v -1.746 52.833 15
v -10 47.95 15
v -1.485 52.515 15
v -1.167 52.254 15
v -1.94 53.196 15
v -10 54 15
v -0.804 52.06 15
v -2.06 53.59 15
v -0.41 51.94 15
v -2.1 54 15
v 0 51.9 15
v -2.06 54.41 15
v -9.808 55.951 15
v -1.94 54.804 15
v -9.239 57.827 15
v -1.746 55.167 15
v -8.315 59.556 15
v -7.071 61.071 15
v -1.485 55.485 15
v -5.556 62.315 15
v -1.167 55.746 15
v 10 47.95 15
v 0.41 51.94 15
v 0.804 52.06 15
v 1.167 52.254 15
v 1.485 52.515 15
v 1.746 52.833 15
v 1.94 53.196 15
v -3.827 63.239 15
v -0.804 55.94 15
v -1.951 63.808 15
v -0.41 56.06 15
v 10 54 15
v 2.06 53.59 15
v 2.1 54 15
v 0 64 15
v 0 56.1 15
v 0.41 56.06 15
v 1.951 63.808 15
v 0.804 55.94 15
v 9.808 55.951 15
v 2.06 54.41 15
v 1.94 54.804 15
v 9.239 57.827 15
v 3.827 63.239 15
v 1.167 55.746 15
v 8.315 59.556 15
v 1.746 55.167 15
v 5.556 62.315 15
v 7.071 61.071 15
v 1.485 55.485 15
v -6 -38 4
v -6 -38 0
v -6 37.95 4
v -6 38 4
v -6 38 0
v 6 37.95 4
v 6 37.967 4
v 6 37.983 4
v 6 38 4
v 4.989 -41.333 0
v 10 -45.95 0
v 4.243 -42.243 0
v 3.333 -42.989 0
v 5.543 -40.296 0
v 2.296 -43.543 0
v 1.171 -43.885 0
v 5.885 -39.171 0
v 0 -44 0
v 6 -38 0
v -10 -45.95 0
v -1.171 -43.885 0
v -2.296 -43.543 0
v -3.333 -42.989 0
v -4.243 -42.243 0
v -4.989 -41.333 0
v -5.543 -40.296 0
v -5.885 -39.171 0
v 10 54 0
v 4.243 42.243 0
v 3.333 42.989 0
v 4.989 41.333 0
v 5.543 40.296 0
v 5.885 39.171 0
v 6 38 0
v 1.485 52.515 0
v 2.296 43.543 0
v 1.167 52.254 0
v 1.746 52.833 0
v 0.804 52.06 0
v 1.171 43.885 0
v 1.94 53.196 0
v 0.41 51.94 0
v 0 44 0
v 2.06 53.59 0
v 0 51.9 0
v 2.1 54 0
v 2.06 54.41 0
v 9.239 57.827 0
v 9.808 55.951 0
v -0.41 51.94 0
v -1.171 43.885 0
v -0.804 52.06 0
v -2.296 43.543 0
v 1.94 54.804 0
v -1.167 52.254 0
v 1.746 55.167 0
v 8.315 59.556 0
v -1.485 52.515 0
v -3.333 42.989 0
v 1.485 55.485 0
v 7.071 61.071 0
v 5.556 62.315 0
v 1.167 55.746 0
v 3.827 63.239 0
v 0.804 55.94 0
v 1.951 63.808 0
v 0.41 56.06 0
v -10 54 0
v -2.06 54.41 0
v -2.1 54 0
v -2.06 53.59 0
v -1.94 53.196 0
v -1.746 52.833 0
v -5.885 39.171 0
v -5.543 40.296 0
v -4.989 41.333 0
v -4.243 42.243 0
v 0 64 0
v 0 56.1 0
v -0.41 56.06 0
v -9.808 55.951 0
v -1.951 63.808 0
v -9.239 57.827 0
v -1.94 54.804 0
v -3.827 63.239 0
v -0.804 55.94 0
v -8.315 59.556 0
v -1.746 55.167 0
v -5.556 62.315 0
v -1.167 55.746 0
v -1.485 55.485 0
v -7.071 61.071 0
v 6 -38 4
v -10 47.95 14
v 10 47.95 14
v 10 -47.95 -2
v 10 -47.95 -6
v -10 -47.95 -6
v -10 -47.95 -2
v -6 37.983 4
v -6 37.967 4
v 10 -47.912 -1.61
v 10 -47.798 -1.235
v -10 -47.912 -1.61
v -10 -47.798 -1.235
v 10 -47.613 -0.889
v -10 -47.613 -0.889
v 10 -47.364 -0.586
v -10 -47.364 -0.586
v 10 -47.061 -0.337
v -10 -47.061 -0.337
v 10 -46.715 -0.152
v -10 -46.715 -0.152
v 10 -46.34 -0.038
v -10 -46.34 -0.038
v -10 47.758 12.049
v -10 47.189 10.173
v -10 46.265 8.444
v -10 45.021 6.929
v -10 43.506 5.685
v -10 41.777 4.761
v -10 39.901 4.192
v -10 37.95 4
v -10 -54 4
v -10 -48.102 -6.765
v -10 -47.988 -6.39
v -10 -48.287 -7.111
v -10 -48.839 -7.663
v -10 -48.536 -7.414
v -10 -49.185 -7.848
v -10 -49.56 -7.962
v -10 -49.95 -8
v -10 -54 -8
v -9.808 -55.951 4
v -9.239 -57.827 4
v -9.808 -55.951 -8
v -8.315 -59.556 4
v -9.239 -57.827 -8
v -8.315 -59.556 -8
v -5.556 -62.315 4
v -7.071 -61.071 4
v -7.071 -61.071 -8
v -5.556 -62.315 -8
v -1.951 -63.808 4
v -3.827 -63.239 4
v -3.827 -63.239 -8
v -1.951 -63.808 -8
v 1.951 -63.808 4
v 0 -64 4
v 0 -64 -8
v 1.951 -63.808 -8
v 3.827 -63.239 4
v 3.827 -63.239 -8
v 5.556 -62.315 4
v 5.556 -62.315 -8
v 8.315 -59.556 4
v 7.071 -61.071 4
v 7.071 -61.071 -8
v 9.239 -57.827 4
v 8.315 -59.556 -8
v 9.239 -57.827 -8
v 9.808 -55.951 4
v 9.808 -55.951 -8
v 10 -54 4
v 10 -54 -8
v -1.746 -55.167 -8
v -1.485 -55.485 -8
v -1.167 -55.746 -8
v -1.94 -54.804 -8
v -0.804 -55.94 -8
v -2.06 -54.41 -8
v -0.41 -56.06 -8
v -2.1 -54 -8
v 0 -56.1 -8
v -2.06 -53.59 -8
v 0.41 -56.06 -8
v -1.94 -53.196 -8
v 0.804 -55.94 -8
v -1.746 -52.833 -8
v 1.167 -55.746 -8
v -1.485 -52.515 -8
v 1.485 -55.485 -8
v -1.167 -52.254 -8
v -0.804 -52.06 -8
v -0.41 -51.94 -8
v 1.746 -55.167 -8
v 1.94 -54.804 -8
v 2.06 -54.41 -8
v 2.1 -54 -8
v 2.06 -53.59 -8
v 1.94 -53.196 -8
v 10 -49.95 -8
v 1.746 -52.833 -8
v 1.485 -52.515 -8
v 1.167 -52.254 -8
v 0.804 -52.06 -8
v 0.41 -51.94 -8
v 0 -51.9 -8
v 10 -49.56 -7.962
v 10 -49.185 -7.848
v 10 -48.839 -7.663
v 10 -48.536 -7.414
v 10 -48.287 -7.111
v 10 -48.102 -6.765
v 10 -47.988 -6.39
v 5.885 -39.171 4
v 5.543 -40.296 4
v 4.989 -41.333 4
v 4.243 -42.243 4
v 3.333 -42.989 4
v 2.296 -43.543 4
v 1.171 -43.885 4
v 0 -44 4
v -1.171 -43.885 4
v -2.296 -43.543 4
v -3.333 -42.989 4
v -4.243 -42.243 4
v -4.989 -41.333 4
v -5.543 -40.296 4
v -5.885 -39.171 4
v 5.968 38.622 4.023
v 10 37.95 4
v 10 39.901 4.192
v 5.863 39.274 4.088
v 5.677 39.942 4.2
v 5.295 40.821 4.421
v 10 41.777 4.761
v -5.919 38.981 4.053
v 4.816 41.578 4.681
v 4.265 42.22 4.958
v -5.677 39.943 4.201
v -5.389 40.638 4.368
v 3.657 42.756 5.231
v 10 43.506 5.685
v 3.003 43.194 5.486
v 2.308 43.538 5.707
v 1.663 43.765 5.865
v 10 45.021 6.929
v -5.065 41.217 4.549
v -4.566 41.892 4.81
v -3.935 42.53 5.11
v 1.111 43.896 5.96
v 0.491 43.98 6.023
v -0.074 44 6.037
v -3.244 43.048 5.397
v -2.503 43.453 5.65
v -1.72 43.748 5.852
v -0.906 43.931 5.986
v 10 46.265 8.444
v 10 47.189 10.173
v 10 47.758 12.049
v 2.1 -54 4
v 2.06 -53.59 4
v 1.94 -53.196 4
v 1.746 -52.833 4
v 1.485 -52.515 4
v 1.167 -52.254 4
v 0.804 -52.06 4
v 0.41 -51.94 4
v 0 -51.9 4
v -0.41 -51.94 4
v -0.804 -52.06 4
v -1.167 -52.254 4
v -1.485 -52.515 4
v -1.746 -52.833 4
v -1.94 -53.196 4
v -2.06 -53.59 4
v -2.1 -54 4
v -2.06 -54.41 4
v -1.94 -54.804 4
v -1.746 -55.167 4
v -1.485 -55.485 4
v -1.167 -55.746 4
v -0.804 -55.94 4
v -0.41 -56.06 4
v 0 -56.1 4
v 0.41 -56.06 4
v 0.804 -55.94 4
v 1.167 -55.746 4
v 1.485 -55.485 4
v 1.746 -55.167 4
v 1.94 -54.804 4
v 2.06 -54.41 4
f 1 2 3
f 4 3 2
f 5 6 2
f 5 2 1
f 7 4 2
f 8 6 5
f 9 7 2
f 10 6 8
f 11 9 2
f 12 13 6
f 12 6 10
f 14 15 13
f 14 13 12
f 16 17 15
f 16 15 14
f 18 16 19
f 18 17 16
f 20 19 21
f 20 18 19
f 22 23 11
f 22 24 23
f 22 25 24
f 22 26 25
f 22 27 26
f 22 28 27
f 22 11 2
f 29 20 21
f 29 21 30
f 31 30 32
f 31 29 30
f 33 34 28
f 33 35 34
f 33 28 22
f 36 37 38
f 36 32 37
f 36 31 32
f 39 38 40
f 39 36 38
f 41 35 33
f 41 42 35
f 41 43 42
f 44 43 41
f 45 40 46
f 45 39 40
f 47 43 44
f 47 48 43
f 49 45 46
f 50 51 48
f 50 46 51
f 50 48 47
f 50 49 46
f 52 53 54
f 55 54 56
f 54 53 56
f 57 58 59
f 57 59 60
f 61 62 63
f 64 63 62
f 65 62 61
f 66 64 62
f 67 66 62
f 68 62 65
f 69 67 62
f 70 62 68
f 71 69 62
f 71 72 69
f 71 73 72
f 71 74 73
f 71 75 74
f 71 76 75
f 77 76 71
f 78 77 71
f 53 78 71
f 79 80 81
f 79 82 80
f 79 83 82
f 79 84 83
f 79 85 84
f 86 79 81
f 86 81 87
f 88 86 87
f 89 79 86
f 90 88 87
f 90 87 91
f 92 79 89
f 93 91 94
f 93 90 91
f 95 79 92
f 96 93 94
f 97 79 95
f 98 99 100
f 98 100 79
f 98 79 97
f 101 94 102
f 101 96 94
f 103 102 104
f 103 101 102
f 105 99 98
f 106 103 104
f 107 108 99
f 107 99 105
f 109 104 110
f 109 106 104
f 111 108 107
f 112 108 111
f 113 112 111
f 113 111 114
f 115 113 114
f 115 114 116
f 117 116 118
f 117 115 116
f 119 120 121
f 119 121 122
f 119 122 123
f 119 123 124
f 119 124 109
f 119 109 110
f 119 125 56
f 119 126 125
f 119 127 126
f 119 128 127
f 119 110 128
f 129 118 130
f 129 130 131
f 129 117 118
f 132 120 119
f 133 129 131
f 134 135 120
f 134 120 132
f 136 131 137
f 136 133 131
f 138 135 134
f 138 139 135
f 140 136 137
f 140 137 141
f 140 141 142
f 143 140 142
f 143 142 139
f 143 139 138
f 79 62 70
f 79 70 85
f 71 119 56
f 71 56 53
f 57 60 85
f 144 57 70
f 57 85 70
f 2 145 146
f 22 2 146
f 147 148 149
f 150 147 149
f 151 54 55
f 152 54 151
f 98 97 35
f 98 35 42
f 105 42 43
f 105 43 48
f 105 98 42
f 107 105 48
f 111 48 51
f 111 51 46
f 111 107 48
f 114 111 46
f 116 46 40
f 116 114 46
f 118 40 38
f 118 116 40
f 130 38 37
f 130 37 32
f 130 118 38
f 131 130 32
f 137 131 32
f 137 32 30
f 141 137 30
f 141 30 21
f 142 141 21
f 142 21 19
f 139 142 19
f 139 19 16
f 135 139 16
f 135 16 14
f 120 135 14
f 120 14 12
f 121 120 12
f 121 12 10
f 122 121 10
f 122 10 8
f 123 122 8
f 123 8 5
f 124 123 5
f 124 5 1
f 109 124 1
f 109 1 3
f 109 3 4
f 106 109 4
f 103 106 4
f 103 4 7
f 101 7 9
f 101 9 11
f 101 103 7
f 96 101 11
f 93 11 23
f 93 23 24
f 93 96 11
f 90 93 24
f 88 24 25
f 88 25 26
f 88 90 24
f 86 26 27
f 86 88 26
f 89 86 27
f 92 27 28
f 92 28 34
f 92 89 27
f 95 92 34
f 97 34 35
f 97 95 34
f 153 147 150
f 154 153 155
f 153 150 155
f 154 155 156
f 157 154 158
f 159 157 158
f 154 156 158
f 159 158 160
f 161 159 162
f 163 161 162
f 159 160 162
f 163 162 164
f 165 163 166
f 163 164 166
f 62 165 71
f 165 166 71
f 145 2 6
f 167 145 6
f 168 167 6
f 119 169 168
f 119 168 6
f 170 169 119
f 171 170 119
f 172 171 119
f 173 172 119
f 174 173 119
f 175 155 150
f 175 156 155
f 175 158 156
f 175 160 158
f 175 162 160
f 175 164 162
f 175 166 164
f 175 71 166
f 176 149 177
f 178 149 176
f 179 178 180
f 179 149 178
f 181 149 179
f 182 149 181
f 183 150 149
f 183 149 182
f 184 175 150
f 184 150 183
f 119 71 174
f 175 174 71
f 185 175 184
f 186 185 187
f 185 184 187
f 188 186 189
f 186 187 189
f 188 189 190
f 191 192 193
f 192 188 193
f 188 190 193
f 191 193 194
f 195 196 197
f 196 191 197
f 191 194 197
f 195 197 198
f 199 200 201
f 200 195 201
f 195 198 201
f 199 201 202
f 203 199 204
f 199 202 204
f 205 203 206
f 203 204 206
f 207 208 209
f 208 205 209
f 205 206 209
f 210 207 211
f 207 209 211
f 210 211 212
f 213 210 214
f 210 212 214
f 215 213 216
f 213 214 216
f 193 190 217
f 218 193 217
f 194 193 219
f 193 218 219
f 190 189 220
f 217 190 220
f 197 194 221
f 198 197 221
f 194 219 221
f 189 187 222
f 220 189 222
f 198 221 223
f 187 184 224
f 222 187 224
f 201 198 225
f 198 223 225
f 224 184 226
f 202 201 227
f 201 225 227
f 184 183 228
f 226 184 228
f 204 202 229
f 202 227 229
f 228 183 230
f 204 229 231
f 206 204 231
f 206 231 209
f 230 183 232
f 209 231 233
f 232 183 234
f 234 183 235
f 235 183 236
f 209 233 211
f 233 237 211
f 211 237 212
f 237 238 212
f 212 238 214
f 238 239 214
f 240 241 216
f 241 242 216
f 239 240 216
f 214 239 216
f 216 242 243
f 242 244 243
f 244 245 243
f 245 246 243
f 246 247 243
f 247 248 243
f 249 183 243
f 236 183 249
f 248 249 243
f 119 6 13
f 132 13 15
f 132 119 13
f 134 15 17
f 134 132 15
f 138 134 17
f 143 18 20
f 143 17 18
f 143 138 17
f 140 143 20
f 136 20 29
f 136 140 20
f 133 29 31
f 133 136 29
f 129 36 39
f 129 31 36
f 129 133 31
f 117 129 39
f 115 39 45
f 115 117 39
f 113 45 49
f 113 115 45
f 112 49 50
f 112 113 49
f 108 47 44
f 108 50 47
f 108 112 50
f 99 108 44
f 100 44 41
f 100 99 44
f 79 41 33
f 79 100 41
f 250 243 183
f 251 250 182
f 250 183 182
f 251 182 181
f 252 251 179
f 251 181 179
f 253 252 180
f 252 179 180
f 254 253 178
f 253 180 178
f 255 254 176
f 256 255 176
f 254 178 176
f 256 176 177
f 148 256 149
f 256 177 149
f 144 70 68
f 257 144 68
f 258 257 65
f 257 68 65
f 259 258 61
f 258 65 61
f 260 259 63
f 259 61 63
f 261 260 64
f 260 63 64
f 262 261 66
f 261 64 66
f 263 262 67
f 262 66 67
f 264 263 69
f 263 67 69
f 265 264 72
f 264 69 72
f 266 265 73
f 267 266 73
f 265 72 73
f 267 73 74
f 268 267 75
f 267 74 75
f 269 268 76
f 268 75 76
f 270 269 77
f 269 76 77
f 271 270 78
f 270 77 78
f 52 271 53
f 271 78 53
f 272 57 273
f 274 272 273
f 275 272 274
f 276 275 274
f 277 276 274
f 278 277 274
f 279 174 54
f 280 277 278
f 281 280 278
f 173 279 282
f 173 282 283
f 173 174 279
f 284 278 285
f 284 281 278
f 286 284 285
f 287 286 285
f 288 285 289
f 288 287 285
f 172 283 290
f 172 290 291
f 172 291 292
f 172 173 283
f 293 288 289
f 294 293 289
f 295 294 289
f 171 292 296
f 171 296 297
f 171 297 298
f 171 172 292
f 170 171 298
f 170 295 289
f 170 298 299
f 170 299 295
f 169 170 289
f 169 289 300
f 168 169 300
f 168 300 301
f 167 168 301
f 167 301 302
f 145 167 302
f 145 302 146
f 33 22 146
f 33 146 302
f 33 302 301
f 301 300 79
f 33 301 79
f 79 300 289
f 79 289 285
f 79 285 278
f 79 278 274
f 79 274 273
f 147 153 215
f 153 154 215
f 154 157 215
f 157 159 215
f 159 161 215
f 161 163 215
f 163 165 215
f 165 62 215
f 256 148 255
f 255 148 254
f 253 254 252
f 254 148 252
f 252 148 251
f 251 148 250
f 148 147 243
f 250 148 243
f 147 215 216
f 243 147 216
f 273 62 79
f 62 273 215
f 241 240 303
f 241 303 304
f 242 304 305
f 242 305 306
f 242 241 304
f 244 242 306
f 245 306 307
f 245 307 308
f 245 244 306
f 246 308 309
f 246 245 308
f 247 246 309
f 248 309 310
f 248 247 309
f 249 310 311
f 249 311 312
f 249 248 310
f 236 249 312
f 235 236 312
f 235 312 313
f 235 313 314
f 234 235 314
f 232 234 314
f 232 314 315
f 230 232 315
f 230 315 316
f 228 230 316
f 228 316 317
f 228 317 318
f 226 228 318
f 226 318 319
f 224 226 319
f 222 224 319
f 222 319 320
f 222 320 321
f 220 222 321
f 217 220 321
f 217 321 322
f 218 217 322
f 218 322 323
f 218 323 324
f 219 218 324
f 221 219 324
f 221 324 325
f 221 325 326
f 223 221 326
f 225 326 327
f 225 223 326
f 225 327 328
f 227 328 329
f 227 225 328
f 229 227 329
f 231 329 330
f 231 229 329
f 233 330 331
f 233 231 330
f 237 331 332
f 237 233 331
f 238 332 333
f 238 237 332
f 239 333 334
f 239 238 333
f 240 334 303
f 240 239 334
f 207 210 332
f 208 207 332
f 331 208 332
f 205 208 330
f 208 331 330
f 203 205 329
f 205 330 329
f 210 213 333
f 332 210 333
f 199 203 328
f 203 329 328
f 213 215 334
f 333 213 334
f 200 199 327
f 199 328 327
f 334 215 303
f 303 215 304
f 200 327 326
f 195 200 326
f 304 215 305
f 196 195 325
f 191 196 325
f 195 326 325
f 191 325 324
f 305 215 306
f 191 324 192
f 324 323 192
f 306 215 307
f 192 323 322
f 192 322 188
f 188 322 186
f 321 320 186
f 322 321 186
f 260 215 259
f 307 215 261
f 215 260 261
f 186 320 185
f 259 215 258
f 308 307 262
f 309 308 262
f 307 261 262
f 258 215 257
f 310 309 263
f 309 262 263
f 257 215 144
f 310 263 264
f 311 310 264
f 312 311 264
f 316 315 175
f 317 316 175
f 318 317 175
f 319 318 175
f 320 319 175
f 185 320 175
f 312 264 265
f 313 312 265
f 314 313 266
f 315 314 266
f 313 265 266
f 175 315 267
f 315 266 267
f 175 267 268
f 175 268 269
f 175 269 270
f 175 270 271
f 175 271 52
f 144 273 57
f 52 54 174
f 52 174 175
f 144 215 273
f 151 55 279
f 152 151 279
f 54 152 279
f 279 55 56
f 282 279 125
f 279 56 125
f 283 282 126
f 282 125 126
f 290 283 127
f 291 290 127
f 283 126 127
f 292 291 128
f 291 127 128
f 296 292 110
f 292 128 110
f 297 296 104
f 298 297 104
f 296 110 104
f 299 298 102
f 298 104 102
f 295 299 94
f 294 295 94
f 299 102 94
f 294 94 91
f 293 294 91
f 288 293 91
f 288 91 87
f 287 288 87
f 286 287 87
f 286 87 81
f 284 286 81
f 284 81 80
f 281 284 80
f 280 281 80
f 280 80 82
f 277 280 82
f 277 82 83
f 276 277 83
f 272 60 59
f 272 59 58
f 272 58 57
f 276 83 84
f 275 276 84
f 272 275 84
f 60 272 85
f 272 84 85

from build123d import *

# Parameters (mm, degrees)
CROQUIS1_R              = 2.1
SALIENTE_EXTRUIR1_DEPTH = 4
SALIENTE_EXTRUIR2_START = -8
CROQUIS1_5_R            = 2.1
SALIENTE_EXTRUIR2_DEPTH = 8
REDONDEO2_R             = 2
CROQUIS1_6_R            = 2.1
SALIENTE_EXTRUIR3_DEPTH = 15
REDONDEO1_R             = 10


with BuildPart() as part:
    # Croquis1 → Saliente-Extruir1 (new body)
    with BuildSketch(Plane.XY):
        with BuildLine():
            Line((10, 54), (10, -54))
            ThreePointArc((10, -54), (0, -64), (-10, -54))
            Line((-10, -54), (-10, 54))
            ThreePointArc((-10, 54), (0, 64), (10, 54))
        make_face()
        with Locations((0, 54)):
            Circle(CROQUIS1_R, mode=Mode.SUBTRACT)
        with Locations((0, -54)):
            Circle(CROQUIS1_R, mode=Mode.SUBTRACT)
        with BuildLine():
            Line((6, 38), (6, -38))
            ThreePointArc((6, -38), (0, -44), (-6, -38))
            Line((-6, -38), (-6, 38))
            ThreePointArc((-6, 38), (0, 44), (6, 38))
        make_face(mode=Mode.SUBTRACT)
    extrude(amount=SALIENTE_EXTRUIR1_DEPTH)

    # Croquis1<5> → Saliente-Extruir2 (add)
    with BuildSketch(Plane.XY.offset(SALIENTE_EXTRUIR2_START)):
        with BuildLine():
            Line((10, -54), (10, -47.95))
            Line((10, -47.95), (-10, -47.95))
            Line((-10, -47.95), (-10, -54))
            ThreePointArc((-10, -54), (0, -64), (10, -54))
        make_face()
        with Locations((0, -54)):
            Circle(CROQUIS1_5_R, mode=Mode.SUBTRACT)
    extrude(amount=SALIENTE_EXTRUIR2_DEPTH)

    # Redondeo2
    redondeo2_edges = [part.edges().sort_by_distance(p)[0] for p in [
        (0, -47.95, 0),
        (0, -47.95, -8),
    ]]
    fillet(redondeo2_edges, radius=REDONDEO2_R)

    # Croquis1<6> → Saliente-Extruir3 (add)
    with BuildSketch(Plane.XY):
        with BuildLine():
            Line((10, 47.95), (10, 54))
            ThreePointArc((10, 54), (0, 64), (-10, 54))
            Line((-10, 54), (-10, 47.95))
            Line((-10, 47.95), (10, 47.95))
        make_face()
        with Locations((0, 54)):
            Circle(CROQUIS1_6_R, mode=Mode.SUBTRACT)
    extrude(amount=SALIENTE_EXTRUIR3_DEPTH)

    # Redondeo1
    # the kernel refuses this fillet: 10 mm, written as the material it adds along each edge
    with BuildSketch(Plane(origin=(-10, 47.95, 4), x_dir=(0, 0, 1), z_dir=(1, 0, 0))) as redondeo1_piece_1_section:
        with BuildLine():
            CenterArc((REDONDEO1_R, REDONDEO1_R), REDONDEO1_R, 180, 90)
            Line((0, REDONDEO1_R), (0, 0))
            Line((0, 0), (REDONDEO1_R, 0))
        make_face()
    redondeo1_piece_1 = extrude(amount=20, mode=Mode.PRIVATE)
    redondeo1_piece_1 = redondeo1_piece_1 - Plane(origin=(0, 38, 6.263951143), x_dir=(-1, 0, 0), z_dir=(0, 0, -1)) * Cylinder(6, 80, mode=Mode.PRIVATE)
    add(redondeo1_piece_1)


solid = part.part
